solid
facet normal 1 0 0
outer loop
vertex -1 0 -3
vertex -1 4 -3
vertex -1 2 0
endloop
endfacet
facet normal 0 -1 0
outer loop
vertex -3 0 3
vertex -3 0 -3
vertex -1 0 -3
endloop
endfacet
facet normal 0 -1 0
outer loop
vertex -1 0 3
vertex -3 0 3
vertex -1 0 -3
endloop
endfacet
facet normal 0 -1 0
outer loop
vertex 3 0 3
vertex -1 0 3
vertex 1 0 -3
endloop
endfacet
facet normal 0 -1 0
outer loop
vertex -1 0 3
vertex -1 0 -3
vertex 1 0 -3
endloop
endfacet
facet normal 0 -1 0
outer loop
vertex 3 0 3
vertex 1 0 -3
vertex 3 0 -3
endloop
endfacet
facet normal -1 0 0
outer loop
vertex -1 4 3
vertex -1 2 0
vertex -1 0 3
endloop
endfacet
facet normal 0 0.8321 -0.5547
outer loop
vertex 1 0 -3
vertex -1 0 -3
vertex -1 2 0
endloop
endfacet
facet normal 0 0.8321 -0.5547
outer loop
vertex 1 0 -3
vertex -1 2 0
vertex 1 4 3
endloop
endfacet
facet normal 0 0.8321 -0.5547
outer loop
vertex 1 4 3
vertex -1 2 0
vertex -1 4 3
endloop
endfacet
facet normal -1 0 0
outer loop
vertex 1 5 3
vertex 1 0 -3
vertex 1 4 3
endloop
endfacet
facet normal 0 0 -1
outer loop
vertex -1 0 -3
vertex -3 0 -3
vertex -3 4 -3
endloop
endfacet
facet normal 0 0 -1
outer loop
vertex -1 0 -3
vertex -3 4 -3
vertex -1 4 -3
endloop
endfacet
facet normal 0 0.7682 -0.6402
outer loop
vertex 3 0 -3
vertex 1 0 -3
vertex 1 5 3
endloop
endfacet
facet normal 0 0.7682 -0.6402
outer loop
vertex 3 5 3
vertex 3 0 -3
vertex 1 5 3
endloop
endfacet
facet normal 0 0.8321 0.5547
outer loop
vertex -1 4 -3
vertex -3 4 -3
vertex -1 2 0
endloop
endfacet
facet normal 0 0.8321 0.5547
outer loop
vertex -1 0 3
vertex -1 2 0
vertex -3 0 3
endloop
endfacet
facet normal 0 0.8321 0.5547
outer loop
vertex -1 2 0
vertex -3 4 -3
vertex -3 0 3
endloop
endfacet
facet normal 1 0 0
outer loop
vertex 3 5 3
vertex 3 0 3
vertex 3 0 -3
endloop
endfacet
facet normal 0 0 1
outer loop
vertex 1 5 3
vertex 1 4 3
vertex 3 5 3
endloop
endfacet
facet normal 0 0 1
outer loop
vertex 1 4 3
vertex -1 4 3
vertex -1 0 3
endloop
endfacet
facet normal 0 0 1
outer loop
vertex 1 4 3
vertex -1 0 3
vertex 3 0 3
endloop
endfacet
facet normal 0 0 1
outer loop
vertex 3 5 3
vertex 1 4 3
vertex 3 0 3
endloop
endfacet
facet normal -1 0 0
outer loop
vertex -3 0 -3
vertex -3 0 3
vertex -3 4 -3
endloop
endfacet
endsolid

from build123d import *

# Parameters (mm, degrees)
SKETCH1_W           = 6
SKETCH1_H           = 6
BOSS_EXTRUDE1_DEPTH = 5
CUT_EXTRUDE1_DEPTH  = 2
CUT_EXTRUDE2_DEPTH  = 2
CUT_EXTRUDE3_DEPTH  = 2


with BuildPart() as part:
    # Sketch1 → Boss-Extrude1 (new body)
    with BuildSketch(Plane(origin=(0, 0, 0), x_dir=(1, 0, 0), z_dir=(0, 1, 0))):
        Rectangle(SKETCH1_W, SKETCH1_H)
    extrude(amount=BOSS_EXTRUDE1_DEPTH)

    # Sketch2 → Cut-Extrude1 (cut)
    with BuildSketch(Plane.ZY.offset(3)):
        Polygon((3, 5), (-3, 5), (-3, 4), (3, 0), align=None)
    extrude(amount=-CUT_EXTRUDE1_DEPTH, mode=Mode.SUBTRACT)

    # Sketch3 → Cut-Extrude2 (cut)
    with BuildSketch(Plane.ZY.offset(1)):
        Polygon((-3, 0), (3, 4), (3, 5), (-3, 5), align=None)
    extrude(amount=-CUT_EXTRUDE2_DEPTH, mode=Mode.SUBTRACT)

    # Sketch4 → Cut-Extrude3 (cut)
    with BuildSketch(Plane.ZY.offset(-1)):
        Polygon((-3, 0), (3, 5), (-3, 5), align=None)
    extrude(amount=-CUT_EXTRUDE3_DEPTH, mode=Mode.SUBTRACT)


solid = part.part
